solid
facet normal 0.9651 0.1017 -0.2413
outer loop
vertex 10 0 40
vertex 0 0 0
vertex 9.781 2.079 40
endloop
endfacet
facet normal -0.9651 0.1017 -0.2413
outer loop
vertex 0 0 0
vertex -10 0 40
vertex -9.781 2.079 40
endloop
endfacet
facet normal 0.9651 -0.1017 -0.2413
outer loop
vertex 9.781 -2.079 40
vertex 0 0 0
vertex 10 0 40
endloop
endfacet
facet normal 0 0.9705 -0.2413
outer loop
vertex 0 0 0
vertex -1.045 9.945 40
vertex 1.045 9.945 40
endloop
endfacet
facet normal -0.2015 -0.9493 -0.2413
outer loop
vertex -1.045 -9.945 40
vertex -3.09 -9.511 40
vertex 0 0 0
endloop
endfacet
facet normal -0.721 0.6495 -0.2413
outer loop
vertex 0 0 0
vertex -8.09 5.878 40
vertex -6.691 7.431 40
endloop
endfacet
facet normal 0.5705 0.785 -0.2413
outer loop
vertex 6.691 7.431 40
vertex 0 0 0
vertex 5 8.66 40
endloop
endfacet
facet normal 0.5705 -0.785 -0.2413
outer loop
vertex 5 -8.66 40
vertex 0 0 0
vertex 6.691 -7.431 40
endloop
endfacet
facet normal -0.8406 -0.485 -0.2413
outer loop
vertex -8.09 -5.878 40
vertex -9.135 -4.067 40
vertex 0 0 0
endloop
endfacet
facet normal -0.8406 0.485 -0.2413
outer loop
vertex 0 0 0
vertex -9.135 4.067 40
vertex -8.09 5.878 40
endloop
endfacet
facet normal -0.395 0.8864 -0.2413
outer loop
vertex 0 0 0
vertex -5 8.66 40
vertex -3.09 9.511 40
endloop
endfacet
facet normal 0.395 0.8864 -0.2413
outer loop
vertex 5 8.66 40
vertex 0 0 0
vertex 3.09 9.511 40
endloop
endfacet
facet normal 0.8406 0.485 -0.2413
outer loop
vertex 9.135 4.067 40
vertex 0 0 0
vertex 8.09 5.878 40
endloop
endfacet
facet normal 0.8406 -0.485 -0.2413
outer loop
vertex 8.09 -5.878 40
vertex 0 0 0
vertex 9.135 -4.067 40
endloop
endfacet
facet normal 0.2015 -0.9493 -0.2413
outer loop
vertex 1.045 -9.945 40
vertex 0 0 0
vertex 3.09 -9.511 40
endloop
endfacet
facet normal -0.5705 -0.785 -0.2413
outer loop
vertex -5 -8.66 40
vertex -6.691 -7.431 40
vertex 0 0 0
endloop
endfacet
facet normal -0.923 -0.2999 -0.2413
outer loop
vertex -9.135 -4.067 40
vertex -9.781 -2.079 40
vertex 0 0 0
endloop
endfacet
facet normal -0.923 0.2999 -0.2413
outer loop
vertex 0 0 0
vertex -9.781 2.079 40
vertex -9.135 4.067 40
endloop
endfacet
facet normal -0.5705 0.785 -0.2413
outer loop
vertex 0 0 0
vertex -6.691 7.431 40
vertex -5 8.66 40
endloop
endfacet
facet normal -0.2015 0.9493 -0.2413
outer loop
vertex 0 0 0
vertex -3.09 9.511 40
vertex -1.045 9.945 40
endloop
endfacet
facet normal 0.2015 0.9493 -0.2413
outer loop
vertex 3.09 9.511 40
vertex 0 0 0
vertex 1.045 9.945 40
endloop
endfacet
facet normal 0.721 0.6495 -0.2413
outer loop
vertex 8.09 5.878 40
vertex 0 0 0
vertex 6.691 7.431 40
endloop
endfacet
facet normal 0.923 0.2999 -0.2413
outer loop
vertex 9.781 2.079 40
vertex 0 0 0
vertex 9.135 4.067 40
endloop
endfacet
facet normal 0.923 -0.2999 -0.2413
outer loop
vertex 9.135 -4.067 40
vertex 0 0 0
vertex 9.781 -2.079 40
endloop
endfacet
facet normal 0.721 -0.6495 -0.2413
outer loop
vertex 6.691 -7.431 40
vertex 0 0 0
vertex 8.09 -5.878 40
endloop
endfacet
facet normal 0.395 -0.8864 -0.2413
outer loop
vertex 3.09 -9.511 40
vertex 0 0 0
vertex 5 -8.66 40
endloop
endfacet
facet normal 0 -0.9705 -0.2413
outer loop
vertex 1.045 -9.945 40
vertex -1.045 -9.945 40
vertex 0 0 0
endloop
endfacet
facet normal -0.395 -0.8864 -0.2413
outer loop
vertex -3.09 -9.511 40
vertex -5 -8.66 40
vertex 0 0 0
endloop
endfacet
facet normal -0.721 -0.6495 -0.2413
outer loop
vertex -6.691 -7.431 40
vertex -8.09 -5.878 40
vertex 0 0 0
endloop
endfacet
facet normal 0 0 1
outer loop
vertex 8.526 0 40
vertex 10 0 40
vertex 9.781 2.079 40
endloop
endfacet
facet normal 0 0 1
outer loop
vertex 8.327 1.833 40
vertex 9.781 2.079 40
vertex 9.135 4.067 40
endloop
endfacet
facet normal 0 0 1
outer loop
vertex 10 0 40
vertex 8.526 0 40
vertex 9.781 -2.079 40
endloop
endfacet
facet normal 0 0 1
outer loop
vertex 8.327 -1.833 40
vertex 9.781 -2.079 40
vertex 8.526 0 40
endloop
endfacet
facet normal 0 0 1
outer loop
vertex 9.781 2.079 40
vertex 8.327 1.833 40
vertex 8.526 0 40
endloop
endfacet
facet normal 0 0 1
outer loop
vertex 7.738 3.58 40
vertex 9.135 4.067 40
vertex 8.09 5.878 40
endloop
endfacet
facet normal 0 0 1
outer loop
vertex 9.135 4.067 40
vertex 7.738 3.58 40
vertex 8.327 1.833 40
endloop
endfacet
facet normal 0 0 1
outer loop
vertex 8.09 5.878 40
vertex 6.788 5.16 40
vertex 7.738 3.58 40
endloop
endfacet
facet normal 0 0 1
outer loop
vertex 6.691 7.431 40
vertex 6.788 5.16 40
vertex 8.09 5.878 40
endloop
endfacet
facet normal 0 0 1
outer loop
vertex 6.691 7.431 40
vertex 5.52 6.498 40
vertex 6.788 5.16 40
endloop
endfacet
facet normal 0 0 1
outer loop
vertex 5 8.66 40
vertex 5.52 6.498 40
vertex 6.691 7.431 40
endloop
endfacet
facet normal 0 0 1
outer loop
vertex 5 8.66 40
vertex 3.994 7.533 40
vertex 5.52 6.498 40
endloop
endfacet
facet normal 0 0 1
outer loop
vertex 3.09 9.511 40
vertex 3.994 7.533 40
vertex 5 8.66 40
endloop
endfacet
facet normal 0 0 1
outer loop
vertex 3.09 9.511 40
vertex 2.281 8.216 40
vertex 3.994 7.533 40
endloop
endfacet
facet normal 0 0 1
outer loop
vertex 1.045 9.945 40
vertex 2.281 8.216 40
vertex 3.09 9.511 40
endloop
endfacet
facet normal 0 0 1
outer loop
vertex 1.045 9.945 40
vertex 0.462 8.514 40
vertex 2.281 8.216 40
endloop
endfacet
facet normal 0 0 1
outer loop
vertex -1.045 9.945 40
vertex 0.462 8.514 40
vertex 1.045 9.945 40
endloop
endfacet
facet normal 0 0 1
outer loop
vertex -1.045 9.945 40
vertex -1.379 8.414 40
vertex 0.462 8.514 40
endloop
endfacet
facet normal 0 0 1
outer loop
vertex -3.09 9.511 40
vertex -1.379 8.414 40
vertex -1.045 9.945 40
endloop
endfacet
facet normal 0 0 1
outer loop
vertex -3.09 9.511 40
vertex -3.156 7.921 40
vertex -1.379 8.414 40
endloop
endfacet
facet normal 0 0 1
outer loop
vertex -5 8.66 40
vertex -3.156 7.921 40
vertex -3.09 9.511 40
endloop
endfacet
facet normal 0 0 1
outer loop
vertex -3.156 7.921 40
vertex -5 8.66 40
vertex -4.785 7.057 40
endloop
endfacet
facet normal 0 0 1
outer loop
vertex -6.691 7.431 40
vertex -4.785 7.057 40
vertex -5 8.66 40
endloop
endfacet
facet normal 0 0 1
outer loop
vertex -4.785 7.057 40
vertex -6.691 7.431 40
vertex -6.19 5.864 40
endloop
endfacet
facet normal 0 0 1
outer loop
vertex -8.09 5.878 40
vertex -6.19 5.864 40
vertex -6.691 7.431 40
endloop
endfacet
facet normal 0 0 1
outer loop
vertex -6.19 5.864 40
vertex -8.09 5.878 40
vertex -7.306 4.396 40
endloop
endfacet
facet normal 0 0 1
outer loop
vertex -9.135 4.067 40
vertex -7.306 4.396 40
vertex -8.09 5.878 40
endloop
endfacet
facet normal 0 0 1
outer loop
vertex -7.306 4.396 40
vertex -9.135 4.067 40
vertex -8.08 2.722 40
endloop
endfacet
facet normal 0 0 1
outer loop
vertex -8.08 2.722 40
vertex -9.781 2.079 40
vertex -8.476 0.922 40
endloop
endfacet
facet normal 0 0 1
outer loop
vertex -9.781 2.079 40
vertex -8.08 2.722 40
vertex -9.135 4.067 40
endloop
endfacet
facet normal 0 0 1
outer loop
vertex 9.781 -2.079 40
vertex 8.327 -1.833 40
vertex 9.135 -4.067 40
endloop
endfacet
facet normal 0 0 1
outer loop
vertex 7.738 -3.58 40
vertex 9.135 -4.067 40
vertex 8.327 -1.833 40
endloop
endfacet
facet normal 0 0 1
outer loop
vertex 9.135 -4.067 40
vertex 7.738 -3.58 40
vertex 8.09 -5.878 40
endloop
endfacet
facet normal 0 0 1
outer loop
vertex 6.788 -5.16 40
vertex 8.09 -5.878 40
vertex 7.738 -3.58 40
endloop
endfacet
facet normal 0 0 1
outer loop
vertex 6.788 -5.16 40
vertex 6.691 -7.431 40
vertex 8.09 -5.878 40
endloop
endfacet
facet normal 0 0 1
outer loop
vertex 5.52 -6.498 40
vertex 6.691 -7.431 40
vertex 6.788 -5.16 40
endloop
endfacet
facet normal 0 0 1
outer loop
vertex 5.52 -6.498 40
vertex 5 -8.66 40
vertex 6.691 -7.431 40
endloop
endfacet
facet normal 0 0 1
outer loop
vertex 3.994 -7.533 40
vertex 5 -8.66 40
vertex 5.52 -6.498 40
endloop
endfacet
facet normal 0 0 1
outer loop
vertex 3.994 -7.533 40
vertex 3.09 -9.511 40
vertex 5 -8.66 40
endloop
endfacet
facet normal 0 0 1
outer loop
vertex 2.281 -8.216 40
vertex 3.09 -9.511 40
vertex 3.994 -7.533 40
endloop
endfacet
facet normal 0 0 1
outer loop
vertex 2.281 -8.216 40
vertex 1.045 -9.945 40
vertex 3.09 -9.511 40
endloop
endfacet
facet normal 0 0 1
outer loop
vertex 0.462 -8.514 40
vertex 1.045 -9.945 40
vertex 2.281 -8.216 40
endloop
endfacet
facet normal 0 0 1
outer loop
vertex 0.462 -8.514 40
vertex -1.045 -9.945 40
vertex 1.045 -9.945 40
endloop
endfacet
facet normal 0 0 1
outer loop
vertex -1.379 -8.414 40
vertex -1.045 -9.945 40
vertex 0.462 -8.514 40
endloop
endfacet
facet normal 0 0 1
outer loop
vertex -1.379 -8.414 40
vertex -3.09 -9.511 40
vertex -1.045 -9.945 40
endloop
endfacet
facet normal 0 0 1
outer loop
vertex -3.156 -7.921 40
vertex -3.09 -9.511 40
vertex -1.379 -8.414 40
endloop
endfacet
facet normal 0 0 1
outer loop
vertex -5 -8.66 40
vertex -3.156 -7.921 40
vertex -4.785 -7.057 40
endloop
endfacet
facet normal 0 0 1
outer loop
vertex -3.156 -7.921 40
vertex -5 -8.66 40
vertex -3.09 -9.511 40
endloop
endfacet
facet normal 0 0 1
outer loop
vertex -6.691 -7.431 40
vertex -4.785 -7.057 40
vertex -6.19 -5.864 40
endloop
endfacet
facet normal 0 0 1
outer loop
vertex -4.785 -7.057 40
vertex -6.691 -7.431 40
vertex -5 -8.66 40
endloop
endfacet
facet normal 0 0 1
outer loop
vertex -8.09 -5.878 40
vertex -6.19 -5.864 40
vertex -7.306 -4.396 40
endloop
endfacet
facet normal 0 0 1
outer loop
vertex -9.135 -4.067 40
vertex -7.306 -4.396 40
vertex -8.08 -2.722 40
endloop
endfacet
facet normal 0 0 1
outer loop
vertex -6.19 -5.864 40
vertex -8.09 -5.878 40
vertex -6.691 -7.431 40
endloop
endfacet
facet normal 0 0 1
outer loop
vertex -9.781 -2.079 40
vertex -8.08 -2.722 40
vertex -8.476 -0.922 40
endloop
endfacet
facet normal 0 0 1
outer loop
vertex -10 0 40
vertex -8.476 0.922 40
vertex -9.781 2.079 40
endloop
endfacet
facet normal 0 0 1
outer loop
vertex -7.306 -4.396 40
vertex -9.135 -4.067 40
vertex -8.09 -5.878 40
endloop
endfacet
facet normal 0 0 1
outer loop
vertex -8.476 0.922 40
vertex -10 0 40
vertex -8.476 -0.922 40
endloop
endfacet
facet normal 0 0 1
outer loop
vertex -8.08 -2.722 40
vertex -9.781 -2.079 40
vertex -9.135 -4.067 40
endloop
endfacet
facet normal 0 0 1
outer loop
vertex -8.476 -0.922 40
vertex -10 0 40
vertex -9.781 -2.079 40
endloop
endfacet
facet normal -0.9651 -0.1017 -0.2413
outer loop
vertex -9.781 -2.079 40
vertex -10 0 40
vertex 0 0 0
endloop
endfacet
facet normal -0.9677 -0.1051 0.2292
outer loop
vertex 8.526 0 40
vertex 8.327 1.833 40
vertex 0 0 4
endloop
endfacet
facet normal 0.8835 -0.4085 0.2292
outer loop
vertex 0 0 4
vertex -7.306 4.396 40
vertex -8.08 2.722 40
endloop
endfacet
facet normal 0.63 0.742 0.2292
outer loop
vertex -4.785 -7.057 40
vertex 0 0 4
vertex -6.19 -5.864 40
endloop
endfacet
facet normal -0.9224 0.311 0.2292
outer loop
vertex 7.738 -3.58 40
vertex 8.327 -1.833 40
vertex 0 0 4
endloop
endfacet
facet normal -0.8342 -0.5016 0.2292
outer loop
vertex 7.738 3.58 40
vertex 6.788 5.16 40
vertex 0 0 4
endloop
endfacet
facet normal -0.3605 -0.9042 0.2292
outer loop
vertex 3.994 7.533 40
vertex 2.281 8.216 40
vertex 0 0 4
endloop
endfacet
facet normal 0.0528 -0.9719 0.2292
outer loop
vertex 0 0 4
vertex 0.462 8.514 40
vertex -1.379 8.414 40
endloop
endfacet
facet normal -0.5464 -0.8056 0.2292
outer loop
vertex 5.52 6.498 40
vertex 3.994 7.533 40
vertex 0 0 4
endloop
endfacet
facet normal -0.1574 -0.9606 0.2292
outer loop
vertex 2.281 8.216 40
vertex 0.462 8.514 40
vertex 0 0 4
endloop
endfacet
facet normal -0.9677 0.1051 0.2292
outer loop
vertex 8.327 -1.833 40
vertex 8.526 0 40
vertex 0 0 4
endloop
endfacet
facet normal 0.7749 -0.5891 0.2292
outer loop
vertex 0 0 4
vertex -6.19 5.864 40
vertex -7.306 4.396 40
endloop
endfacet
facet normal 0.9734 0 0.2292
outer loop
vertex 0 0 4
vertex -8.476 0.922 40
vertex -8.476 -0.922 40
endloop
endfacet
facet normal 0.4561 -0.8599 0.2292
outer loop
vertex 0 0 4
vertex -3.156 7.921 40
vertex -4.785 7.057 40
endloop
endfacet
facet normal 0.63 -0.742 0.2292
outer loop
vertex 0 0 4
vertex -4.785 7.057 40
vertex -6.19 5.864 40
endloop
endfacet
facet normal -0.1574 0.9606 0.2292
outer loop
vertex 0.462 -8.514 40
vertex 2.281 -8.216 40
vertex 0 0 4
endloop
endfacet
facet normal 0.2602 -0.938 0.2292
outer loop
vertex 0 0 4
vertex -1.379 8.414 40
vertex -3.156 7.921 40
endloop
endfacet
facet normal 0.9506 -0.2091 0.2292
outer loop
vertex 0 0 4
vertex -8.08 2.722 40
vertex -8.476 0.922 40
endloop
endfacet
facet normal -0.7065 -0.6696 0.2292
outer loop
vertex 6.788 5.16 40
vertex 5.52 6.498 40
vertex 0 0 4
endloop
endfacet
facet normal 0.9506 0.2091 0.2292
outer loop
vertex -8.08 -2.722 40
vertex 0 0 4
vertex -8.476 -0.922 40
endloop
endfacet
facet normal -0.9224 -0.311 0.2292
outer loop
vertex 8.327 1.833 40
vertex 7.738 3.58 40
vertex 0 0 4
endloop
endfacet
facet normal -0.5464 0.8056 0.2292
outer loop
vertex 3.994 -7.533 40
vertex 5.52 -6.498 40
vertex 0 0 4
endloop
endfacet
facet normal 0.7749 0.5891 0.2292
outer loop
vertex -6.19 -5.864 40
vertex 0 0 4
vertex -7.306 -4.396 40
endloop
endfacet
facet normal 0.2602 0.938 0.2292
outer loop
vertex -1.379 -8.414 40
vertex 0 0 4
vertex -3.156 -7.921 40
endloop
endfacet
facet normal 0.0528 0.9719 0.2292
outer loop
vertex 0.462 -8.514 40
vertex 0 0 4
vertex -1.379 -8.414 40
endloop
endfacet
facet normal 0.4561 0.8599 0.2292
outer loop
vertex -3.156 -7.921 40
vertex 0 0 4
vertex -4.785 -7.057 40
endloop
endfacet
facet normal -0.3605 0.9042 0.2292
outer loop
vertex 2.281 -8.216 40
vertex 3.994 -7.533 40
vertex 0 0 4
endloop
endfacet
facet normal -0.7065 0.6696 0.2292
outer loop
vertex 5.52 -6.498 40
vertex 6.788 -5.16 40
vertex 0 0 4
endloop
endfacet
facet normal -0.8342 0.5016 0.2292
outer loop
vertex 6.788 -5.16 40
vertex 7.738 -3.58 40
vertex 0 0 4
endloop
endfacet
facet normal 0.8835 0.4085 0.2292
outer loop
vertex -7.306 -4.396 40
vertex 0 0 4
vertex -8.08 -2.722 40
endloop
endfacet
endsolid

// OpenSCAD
//3D Shapes- Design Time: Ice Cream Cone

 difference(){
     cylinder(40,0,10);
     translate([0,0,4]) cylinder(38, 0, 9);
 }
